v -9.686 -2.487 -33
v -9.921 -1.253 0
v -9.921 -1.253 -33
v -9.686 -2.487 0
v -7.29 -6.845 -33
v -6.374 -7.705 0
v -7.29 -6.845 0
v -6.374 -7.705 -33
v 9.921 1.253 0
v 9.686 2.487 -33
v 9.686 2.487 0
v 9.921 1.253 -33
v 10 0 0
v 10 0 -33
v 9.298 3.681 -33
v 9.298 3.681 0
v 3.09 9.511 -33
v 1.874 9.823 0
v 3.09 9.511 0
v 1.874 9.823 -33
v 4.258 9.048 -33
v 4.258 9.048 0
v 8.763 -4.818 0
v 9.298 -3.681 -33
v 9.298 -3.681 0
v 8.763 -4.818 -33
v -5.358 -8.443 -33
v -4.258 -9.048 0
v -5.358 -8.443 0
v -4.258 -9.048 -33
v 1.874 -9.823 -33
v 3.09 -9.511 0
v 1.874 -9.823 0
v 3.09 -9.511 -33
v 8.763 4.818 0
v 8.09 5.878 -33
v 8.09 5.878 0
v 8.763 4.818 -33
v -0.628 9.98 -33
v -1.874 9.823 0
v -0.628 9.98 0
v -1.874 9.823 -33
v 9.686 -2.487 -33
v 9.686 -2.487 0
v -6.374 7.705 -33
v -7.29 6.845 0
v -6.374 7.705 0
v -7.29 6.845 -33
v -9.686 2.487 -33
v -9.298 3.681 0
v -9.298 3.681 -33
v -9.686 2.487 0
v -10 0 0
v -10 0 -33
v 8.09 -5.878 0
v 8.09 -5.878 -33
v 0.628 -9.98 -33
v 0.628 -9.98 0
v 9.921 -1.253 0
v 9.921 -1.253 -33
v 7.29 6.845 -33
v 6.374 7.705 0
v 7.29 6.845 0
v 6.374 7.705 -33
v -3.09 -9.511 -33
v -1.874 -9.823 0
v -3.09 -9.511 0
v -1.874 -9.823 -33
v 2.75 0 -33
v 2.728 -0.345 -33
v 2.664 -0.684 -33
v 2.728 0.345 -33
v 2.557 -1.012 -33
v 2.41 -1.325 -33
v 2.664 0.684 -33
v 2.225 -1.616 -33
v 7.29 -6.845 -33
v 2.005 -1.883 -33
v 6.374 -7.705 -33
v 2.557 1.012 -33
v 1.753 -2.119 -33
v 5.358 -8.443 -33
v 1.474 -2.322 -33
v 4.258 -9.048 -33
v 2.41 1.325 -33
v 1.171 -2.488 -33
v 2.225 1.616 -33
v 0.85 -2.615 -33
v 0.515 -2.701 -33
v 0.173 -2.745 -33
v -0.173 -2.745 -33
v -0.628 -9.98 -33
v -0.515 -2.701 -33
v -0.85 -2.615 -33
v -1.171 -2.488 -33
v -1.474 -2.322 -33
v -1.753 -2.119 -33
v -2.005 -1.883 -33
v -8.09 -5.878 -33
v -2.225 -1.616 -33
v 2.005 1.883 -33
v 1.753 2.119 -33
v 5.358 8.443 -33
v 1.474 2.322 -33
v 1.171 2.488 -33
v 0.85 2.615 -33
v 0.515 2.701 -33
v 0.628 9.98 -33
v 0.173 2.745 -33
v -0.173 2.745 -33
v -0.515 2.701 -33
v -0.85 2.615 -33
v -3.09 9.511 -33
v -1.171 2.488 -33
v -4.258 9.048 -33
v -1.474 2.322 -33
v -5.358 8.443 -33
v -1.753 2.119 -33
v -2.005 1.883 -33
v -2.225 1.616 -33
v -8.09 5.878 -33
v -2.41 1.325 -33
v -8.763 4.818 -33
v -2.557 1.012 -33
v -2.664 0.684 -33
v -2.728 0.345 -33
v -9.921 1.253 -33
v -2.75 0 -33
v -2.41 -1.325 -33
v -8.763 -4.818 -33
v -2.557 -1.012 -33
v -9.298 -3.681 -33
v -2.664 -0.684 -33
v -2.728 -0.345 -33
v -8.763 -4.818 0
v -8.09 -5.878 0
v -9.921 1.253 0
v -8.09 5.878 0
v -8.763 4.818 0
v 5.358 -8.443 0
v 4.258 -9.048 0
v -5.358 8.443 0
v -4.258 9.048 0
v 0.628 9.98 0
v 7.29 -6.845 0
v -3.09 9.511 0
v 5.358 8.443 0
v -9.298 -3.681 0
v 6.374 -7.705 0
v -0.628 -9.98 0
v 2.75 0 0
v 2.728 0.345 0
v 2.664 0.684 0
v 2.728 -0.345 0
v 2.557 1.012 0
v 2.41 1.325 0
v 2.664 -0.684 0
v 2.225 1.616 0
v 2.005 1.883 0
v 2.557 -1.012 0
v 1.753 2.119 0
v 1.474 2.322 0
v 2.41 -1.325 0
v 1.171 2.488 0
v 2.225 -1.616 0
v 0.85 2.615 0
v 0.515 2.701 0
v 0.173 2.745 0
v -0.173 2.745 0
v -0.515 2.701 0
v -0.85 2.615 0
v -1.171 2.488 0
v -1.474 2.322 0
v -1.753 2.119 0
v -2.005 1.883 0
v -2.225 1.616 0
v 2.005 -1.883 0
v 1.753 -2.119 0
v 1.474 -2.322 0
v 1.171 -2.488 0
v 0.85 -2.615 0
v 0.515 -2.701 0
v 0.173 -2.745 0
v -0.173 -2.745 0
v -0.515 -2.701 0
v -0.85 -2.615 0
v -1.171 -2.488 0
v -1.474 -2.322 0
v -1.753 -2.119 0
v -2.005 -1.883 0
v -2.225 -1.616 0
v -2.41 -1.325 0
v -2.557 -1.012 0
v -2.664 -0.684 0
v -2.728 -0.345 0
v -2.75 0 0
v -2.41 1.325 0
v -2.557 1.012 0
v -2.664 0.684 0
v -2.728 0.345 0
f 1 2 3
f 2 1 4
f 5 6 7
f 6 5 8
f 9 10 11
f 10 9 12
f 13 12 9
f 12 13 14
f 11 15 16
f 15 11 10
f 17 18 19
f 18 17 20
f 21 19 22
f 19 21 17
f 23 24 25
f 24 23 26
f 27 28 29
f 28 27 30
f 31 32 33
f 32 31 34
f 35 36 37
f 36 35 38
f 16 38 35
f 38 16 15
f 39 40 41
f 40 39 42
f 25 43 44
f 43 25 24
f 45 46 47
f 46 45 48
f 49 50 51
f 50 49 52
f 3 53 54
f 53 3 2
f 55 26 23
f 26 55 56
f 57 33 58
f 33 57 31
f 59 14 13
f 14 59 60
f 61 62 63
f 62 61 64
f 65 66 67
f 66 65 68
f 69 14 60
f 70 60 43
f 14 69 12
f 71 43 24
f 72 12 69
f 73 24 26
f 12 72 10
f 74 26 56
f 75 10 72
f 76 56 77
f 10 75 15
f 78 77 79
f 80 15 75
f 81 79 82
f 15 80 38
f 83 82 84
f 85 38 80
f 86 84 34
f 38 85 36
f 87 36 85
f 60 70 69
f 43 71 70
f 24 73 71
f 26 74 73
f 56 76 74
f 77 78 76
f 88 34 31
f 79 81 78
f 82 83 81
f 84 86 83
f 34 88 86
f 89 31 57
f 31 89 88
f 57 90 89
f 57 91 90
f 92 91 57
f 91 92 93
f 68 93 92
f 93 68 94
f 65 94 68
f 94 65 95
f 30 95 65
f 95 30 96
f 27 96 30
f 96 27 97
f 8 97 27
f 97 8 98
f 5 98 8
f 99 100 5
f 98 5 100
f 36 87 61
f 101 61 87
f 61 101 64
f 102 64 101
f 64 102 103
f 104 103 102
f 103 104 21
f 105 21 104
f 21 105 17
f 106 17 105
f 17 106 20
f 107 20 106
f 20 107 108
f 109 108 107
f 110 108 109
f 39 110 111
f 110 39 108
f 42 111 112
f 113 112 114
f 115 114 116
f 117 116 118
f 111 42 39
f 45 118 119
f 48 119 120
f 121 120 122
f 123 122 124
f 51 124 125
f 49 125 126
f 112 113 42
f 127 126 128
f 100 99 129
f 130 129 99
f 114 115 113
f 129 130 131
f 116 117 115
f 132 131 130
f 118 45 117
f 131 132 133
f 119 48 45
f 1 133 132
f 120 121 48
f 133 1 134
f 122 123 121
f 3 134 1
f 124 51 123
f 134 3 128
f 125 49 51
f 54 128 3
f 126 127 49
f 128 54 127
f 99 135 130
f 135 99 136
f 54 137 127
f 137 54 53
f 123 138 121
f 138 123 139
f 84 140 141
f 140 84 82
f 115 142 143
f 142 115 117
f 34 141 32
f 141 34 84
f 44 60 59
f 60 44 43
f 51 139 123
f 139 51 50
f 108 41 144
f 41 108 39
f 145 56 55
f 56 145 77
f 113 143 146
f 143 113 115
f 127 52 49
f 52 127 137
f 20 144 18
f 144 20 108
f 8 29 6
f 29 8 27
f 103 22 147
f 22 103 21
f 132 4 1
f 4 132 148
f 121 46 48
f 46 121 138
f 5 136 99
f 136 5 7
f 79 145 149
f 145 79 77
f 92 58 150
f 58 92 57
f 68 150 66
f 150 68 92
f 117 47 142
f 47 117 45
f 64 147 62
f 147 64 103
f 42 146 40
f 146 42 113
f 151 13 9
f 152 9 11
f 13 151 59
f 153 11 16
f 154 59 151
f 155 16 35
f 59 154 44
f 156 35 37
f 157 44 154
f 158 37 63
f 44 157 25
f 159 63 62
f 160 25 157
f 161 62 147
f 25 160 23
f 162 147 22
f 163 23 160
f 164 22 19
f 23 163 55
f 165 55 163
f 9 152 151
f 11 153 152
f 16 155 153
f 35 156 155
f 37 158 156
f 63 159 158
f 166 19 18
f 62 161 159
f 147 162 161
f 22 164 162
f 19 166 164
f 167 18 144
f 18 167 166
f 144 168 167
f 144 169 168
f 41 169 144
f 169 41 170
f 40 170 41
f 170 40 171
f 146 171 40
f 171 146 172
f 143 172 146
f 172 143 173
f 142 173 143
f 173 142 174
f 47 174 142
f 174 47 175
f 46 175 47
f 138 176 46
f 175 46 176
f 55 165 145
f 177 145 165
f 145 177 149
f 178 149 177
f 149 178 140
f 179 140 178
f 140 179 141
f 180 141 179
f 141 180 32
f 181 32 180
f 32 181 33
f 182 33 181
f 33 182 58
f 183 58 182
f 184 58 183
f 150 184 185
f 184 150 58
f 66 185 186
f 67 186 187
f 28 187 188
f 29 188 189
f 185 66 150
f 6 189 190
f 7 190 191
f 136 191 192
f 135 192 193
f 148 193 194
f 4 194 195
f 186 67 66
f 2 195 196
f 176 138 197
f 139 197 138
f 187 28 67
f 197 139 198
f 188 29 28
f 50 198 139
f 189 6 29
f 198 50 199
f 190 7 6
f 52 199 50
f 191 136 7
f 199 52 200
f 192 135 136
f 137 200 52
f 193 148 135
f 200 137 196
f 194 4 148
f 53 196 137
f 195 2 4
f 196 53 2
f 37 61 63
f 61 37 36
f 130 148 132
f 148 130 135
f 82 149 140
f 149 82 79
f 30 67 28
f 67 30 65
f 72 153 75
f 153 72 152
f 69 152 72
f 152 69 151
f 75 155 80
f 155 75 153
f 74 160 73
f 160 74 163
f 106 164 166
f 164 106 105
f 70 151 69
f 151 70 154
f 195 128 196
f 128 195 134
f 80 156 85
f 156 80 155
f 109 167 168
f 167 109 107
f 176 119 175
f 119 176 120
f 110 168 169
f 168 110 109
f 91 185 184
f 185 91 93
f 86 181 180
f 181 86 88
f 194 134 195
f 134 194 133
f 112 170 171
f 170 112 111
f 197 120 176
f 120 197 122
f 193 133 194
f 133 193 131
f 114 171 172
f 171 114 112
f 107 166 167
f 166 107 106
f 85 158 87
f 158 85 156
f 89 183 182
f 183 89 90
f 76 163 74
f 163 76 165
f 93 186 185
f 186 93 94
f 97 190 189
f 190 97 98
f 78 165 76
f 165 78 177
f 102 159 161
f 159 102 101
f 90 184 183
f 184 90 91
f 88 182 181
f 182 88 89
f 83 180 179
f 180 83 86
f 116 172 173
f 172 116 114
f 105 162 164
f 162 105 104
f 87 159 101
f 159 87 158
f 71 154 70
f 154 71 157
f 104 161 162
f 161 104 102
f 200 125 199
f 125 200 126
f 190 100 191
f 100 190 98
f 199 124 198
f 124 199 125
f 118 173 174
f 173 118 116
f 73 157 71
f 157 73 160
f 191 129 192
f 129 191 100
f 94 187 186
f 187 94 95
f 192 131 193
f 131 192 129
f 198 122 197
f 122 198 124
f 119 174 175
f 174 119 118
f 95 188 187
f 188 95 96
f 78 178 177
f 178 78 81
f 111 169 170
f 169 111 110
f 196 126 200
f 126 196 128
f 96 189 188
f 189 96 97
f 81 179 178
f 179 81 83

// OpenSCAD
$fn = 50;


difference() {
	union() {
		translate(v = [0, 0, -33.0000000000]) {
			cylinder(h = 33, r = 10.0000000000);
		}
		cylinder(h = 0, r = 20.0000000000);
	}
	union() {
		#translate(v = [0, 0, -33]) {
			cylinder(h = 33, r = 2.7500000000);
		}
	}
}
